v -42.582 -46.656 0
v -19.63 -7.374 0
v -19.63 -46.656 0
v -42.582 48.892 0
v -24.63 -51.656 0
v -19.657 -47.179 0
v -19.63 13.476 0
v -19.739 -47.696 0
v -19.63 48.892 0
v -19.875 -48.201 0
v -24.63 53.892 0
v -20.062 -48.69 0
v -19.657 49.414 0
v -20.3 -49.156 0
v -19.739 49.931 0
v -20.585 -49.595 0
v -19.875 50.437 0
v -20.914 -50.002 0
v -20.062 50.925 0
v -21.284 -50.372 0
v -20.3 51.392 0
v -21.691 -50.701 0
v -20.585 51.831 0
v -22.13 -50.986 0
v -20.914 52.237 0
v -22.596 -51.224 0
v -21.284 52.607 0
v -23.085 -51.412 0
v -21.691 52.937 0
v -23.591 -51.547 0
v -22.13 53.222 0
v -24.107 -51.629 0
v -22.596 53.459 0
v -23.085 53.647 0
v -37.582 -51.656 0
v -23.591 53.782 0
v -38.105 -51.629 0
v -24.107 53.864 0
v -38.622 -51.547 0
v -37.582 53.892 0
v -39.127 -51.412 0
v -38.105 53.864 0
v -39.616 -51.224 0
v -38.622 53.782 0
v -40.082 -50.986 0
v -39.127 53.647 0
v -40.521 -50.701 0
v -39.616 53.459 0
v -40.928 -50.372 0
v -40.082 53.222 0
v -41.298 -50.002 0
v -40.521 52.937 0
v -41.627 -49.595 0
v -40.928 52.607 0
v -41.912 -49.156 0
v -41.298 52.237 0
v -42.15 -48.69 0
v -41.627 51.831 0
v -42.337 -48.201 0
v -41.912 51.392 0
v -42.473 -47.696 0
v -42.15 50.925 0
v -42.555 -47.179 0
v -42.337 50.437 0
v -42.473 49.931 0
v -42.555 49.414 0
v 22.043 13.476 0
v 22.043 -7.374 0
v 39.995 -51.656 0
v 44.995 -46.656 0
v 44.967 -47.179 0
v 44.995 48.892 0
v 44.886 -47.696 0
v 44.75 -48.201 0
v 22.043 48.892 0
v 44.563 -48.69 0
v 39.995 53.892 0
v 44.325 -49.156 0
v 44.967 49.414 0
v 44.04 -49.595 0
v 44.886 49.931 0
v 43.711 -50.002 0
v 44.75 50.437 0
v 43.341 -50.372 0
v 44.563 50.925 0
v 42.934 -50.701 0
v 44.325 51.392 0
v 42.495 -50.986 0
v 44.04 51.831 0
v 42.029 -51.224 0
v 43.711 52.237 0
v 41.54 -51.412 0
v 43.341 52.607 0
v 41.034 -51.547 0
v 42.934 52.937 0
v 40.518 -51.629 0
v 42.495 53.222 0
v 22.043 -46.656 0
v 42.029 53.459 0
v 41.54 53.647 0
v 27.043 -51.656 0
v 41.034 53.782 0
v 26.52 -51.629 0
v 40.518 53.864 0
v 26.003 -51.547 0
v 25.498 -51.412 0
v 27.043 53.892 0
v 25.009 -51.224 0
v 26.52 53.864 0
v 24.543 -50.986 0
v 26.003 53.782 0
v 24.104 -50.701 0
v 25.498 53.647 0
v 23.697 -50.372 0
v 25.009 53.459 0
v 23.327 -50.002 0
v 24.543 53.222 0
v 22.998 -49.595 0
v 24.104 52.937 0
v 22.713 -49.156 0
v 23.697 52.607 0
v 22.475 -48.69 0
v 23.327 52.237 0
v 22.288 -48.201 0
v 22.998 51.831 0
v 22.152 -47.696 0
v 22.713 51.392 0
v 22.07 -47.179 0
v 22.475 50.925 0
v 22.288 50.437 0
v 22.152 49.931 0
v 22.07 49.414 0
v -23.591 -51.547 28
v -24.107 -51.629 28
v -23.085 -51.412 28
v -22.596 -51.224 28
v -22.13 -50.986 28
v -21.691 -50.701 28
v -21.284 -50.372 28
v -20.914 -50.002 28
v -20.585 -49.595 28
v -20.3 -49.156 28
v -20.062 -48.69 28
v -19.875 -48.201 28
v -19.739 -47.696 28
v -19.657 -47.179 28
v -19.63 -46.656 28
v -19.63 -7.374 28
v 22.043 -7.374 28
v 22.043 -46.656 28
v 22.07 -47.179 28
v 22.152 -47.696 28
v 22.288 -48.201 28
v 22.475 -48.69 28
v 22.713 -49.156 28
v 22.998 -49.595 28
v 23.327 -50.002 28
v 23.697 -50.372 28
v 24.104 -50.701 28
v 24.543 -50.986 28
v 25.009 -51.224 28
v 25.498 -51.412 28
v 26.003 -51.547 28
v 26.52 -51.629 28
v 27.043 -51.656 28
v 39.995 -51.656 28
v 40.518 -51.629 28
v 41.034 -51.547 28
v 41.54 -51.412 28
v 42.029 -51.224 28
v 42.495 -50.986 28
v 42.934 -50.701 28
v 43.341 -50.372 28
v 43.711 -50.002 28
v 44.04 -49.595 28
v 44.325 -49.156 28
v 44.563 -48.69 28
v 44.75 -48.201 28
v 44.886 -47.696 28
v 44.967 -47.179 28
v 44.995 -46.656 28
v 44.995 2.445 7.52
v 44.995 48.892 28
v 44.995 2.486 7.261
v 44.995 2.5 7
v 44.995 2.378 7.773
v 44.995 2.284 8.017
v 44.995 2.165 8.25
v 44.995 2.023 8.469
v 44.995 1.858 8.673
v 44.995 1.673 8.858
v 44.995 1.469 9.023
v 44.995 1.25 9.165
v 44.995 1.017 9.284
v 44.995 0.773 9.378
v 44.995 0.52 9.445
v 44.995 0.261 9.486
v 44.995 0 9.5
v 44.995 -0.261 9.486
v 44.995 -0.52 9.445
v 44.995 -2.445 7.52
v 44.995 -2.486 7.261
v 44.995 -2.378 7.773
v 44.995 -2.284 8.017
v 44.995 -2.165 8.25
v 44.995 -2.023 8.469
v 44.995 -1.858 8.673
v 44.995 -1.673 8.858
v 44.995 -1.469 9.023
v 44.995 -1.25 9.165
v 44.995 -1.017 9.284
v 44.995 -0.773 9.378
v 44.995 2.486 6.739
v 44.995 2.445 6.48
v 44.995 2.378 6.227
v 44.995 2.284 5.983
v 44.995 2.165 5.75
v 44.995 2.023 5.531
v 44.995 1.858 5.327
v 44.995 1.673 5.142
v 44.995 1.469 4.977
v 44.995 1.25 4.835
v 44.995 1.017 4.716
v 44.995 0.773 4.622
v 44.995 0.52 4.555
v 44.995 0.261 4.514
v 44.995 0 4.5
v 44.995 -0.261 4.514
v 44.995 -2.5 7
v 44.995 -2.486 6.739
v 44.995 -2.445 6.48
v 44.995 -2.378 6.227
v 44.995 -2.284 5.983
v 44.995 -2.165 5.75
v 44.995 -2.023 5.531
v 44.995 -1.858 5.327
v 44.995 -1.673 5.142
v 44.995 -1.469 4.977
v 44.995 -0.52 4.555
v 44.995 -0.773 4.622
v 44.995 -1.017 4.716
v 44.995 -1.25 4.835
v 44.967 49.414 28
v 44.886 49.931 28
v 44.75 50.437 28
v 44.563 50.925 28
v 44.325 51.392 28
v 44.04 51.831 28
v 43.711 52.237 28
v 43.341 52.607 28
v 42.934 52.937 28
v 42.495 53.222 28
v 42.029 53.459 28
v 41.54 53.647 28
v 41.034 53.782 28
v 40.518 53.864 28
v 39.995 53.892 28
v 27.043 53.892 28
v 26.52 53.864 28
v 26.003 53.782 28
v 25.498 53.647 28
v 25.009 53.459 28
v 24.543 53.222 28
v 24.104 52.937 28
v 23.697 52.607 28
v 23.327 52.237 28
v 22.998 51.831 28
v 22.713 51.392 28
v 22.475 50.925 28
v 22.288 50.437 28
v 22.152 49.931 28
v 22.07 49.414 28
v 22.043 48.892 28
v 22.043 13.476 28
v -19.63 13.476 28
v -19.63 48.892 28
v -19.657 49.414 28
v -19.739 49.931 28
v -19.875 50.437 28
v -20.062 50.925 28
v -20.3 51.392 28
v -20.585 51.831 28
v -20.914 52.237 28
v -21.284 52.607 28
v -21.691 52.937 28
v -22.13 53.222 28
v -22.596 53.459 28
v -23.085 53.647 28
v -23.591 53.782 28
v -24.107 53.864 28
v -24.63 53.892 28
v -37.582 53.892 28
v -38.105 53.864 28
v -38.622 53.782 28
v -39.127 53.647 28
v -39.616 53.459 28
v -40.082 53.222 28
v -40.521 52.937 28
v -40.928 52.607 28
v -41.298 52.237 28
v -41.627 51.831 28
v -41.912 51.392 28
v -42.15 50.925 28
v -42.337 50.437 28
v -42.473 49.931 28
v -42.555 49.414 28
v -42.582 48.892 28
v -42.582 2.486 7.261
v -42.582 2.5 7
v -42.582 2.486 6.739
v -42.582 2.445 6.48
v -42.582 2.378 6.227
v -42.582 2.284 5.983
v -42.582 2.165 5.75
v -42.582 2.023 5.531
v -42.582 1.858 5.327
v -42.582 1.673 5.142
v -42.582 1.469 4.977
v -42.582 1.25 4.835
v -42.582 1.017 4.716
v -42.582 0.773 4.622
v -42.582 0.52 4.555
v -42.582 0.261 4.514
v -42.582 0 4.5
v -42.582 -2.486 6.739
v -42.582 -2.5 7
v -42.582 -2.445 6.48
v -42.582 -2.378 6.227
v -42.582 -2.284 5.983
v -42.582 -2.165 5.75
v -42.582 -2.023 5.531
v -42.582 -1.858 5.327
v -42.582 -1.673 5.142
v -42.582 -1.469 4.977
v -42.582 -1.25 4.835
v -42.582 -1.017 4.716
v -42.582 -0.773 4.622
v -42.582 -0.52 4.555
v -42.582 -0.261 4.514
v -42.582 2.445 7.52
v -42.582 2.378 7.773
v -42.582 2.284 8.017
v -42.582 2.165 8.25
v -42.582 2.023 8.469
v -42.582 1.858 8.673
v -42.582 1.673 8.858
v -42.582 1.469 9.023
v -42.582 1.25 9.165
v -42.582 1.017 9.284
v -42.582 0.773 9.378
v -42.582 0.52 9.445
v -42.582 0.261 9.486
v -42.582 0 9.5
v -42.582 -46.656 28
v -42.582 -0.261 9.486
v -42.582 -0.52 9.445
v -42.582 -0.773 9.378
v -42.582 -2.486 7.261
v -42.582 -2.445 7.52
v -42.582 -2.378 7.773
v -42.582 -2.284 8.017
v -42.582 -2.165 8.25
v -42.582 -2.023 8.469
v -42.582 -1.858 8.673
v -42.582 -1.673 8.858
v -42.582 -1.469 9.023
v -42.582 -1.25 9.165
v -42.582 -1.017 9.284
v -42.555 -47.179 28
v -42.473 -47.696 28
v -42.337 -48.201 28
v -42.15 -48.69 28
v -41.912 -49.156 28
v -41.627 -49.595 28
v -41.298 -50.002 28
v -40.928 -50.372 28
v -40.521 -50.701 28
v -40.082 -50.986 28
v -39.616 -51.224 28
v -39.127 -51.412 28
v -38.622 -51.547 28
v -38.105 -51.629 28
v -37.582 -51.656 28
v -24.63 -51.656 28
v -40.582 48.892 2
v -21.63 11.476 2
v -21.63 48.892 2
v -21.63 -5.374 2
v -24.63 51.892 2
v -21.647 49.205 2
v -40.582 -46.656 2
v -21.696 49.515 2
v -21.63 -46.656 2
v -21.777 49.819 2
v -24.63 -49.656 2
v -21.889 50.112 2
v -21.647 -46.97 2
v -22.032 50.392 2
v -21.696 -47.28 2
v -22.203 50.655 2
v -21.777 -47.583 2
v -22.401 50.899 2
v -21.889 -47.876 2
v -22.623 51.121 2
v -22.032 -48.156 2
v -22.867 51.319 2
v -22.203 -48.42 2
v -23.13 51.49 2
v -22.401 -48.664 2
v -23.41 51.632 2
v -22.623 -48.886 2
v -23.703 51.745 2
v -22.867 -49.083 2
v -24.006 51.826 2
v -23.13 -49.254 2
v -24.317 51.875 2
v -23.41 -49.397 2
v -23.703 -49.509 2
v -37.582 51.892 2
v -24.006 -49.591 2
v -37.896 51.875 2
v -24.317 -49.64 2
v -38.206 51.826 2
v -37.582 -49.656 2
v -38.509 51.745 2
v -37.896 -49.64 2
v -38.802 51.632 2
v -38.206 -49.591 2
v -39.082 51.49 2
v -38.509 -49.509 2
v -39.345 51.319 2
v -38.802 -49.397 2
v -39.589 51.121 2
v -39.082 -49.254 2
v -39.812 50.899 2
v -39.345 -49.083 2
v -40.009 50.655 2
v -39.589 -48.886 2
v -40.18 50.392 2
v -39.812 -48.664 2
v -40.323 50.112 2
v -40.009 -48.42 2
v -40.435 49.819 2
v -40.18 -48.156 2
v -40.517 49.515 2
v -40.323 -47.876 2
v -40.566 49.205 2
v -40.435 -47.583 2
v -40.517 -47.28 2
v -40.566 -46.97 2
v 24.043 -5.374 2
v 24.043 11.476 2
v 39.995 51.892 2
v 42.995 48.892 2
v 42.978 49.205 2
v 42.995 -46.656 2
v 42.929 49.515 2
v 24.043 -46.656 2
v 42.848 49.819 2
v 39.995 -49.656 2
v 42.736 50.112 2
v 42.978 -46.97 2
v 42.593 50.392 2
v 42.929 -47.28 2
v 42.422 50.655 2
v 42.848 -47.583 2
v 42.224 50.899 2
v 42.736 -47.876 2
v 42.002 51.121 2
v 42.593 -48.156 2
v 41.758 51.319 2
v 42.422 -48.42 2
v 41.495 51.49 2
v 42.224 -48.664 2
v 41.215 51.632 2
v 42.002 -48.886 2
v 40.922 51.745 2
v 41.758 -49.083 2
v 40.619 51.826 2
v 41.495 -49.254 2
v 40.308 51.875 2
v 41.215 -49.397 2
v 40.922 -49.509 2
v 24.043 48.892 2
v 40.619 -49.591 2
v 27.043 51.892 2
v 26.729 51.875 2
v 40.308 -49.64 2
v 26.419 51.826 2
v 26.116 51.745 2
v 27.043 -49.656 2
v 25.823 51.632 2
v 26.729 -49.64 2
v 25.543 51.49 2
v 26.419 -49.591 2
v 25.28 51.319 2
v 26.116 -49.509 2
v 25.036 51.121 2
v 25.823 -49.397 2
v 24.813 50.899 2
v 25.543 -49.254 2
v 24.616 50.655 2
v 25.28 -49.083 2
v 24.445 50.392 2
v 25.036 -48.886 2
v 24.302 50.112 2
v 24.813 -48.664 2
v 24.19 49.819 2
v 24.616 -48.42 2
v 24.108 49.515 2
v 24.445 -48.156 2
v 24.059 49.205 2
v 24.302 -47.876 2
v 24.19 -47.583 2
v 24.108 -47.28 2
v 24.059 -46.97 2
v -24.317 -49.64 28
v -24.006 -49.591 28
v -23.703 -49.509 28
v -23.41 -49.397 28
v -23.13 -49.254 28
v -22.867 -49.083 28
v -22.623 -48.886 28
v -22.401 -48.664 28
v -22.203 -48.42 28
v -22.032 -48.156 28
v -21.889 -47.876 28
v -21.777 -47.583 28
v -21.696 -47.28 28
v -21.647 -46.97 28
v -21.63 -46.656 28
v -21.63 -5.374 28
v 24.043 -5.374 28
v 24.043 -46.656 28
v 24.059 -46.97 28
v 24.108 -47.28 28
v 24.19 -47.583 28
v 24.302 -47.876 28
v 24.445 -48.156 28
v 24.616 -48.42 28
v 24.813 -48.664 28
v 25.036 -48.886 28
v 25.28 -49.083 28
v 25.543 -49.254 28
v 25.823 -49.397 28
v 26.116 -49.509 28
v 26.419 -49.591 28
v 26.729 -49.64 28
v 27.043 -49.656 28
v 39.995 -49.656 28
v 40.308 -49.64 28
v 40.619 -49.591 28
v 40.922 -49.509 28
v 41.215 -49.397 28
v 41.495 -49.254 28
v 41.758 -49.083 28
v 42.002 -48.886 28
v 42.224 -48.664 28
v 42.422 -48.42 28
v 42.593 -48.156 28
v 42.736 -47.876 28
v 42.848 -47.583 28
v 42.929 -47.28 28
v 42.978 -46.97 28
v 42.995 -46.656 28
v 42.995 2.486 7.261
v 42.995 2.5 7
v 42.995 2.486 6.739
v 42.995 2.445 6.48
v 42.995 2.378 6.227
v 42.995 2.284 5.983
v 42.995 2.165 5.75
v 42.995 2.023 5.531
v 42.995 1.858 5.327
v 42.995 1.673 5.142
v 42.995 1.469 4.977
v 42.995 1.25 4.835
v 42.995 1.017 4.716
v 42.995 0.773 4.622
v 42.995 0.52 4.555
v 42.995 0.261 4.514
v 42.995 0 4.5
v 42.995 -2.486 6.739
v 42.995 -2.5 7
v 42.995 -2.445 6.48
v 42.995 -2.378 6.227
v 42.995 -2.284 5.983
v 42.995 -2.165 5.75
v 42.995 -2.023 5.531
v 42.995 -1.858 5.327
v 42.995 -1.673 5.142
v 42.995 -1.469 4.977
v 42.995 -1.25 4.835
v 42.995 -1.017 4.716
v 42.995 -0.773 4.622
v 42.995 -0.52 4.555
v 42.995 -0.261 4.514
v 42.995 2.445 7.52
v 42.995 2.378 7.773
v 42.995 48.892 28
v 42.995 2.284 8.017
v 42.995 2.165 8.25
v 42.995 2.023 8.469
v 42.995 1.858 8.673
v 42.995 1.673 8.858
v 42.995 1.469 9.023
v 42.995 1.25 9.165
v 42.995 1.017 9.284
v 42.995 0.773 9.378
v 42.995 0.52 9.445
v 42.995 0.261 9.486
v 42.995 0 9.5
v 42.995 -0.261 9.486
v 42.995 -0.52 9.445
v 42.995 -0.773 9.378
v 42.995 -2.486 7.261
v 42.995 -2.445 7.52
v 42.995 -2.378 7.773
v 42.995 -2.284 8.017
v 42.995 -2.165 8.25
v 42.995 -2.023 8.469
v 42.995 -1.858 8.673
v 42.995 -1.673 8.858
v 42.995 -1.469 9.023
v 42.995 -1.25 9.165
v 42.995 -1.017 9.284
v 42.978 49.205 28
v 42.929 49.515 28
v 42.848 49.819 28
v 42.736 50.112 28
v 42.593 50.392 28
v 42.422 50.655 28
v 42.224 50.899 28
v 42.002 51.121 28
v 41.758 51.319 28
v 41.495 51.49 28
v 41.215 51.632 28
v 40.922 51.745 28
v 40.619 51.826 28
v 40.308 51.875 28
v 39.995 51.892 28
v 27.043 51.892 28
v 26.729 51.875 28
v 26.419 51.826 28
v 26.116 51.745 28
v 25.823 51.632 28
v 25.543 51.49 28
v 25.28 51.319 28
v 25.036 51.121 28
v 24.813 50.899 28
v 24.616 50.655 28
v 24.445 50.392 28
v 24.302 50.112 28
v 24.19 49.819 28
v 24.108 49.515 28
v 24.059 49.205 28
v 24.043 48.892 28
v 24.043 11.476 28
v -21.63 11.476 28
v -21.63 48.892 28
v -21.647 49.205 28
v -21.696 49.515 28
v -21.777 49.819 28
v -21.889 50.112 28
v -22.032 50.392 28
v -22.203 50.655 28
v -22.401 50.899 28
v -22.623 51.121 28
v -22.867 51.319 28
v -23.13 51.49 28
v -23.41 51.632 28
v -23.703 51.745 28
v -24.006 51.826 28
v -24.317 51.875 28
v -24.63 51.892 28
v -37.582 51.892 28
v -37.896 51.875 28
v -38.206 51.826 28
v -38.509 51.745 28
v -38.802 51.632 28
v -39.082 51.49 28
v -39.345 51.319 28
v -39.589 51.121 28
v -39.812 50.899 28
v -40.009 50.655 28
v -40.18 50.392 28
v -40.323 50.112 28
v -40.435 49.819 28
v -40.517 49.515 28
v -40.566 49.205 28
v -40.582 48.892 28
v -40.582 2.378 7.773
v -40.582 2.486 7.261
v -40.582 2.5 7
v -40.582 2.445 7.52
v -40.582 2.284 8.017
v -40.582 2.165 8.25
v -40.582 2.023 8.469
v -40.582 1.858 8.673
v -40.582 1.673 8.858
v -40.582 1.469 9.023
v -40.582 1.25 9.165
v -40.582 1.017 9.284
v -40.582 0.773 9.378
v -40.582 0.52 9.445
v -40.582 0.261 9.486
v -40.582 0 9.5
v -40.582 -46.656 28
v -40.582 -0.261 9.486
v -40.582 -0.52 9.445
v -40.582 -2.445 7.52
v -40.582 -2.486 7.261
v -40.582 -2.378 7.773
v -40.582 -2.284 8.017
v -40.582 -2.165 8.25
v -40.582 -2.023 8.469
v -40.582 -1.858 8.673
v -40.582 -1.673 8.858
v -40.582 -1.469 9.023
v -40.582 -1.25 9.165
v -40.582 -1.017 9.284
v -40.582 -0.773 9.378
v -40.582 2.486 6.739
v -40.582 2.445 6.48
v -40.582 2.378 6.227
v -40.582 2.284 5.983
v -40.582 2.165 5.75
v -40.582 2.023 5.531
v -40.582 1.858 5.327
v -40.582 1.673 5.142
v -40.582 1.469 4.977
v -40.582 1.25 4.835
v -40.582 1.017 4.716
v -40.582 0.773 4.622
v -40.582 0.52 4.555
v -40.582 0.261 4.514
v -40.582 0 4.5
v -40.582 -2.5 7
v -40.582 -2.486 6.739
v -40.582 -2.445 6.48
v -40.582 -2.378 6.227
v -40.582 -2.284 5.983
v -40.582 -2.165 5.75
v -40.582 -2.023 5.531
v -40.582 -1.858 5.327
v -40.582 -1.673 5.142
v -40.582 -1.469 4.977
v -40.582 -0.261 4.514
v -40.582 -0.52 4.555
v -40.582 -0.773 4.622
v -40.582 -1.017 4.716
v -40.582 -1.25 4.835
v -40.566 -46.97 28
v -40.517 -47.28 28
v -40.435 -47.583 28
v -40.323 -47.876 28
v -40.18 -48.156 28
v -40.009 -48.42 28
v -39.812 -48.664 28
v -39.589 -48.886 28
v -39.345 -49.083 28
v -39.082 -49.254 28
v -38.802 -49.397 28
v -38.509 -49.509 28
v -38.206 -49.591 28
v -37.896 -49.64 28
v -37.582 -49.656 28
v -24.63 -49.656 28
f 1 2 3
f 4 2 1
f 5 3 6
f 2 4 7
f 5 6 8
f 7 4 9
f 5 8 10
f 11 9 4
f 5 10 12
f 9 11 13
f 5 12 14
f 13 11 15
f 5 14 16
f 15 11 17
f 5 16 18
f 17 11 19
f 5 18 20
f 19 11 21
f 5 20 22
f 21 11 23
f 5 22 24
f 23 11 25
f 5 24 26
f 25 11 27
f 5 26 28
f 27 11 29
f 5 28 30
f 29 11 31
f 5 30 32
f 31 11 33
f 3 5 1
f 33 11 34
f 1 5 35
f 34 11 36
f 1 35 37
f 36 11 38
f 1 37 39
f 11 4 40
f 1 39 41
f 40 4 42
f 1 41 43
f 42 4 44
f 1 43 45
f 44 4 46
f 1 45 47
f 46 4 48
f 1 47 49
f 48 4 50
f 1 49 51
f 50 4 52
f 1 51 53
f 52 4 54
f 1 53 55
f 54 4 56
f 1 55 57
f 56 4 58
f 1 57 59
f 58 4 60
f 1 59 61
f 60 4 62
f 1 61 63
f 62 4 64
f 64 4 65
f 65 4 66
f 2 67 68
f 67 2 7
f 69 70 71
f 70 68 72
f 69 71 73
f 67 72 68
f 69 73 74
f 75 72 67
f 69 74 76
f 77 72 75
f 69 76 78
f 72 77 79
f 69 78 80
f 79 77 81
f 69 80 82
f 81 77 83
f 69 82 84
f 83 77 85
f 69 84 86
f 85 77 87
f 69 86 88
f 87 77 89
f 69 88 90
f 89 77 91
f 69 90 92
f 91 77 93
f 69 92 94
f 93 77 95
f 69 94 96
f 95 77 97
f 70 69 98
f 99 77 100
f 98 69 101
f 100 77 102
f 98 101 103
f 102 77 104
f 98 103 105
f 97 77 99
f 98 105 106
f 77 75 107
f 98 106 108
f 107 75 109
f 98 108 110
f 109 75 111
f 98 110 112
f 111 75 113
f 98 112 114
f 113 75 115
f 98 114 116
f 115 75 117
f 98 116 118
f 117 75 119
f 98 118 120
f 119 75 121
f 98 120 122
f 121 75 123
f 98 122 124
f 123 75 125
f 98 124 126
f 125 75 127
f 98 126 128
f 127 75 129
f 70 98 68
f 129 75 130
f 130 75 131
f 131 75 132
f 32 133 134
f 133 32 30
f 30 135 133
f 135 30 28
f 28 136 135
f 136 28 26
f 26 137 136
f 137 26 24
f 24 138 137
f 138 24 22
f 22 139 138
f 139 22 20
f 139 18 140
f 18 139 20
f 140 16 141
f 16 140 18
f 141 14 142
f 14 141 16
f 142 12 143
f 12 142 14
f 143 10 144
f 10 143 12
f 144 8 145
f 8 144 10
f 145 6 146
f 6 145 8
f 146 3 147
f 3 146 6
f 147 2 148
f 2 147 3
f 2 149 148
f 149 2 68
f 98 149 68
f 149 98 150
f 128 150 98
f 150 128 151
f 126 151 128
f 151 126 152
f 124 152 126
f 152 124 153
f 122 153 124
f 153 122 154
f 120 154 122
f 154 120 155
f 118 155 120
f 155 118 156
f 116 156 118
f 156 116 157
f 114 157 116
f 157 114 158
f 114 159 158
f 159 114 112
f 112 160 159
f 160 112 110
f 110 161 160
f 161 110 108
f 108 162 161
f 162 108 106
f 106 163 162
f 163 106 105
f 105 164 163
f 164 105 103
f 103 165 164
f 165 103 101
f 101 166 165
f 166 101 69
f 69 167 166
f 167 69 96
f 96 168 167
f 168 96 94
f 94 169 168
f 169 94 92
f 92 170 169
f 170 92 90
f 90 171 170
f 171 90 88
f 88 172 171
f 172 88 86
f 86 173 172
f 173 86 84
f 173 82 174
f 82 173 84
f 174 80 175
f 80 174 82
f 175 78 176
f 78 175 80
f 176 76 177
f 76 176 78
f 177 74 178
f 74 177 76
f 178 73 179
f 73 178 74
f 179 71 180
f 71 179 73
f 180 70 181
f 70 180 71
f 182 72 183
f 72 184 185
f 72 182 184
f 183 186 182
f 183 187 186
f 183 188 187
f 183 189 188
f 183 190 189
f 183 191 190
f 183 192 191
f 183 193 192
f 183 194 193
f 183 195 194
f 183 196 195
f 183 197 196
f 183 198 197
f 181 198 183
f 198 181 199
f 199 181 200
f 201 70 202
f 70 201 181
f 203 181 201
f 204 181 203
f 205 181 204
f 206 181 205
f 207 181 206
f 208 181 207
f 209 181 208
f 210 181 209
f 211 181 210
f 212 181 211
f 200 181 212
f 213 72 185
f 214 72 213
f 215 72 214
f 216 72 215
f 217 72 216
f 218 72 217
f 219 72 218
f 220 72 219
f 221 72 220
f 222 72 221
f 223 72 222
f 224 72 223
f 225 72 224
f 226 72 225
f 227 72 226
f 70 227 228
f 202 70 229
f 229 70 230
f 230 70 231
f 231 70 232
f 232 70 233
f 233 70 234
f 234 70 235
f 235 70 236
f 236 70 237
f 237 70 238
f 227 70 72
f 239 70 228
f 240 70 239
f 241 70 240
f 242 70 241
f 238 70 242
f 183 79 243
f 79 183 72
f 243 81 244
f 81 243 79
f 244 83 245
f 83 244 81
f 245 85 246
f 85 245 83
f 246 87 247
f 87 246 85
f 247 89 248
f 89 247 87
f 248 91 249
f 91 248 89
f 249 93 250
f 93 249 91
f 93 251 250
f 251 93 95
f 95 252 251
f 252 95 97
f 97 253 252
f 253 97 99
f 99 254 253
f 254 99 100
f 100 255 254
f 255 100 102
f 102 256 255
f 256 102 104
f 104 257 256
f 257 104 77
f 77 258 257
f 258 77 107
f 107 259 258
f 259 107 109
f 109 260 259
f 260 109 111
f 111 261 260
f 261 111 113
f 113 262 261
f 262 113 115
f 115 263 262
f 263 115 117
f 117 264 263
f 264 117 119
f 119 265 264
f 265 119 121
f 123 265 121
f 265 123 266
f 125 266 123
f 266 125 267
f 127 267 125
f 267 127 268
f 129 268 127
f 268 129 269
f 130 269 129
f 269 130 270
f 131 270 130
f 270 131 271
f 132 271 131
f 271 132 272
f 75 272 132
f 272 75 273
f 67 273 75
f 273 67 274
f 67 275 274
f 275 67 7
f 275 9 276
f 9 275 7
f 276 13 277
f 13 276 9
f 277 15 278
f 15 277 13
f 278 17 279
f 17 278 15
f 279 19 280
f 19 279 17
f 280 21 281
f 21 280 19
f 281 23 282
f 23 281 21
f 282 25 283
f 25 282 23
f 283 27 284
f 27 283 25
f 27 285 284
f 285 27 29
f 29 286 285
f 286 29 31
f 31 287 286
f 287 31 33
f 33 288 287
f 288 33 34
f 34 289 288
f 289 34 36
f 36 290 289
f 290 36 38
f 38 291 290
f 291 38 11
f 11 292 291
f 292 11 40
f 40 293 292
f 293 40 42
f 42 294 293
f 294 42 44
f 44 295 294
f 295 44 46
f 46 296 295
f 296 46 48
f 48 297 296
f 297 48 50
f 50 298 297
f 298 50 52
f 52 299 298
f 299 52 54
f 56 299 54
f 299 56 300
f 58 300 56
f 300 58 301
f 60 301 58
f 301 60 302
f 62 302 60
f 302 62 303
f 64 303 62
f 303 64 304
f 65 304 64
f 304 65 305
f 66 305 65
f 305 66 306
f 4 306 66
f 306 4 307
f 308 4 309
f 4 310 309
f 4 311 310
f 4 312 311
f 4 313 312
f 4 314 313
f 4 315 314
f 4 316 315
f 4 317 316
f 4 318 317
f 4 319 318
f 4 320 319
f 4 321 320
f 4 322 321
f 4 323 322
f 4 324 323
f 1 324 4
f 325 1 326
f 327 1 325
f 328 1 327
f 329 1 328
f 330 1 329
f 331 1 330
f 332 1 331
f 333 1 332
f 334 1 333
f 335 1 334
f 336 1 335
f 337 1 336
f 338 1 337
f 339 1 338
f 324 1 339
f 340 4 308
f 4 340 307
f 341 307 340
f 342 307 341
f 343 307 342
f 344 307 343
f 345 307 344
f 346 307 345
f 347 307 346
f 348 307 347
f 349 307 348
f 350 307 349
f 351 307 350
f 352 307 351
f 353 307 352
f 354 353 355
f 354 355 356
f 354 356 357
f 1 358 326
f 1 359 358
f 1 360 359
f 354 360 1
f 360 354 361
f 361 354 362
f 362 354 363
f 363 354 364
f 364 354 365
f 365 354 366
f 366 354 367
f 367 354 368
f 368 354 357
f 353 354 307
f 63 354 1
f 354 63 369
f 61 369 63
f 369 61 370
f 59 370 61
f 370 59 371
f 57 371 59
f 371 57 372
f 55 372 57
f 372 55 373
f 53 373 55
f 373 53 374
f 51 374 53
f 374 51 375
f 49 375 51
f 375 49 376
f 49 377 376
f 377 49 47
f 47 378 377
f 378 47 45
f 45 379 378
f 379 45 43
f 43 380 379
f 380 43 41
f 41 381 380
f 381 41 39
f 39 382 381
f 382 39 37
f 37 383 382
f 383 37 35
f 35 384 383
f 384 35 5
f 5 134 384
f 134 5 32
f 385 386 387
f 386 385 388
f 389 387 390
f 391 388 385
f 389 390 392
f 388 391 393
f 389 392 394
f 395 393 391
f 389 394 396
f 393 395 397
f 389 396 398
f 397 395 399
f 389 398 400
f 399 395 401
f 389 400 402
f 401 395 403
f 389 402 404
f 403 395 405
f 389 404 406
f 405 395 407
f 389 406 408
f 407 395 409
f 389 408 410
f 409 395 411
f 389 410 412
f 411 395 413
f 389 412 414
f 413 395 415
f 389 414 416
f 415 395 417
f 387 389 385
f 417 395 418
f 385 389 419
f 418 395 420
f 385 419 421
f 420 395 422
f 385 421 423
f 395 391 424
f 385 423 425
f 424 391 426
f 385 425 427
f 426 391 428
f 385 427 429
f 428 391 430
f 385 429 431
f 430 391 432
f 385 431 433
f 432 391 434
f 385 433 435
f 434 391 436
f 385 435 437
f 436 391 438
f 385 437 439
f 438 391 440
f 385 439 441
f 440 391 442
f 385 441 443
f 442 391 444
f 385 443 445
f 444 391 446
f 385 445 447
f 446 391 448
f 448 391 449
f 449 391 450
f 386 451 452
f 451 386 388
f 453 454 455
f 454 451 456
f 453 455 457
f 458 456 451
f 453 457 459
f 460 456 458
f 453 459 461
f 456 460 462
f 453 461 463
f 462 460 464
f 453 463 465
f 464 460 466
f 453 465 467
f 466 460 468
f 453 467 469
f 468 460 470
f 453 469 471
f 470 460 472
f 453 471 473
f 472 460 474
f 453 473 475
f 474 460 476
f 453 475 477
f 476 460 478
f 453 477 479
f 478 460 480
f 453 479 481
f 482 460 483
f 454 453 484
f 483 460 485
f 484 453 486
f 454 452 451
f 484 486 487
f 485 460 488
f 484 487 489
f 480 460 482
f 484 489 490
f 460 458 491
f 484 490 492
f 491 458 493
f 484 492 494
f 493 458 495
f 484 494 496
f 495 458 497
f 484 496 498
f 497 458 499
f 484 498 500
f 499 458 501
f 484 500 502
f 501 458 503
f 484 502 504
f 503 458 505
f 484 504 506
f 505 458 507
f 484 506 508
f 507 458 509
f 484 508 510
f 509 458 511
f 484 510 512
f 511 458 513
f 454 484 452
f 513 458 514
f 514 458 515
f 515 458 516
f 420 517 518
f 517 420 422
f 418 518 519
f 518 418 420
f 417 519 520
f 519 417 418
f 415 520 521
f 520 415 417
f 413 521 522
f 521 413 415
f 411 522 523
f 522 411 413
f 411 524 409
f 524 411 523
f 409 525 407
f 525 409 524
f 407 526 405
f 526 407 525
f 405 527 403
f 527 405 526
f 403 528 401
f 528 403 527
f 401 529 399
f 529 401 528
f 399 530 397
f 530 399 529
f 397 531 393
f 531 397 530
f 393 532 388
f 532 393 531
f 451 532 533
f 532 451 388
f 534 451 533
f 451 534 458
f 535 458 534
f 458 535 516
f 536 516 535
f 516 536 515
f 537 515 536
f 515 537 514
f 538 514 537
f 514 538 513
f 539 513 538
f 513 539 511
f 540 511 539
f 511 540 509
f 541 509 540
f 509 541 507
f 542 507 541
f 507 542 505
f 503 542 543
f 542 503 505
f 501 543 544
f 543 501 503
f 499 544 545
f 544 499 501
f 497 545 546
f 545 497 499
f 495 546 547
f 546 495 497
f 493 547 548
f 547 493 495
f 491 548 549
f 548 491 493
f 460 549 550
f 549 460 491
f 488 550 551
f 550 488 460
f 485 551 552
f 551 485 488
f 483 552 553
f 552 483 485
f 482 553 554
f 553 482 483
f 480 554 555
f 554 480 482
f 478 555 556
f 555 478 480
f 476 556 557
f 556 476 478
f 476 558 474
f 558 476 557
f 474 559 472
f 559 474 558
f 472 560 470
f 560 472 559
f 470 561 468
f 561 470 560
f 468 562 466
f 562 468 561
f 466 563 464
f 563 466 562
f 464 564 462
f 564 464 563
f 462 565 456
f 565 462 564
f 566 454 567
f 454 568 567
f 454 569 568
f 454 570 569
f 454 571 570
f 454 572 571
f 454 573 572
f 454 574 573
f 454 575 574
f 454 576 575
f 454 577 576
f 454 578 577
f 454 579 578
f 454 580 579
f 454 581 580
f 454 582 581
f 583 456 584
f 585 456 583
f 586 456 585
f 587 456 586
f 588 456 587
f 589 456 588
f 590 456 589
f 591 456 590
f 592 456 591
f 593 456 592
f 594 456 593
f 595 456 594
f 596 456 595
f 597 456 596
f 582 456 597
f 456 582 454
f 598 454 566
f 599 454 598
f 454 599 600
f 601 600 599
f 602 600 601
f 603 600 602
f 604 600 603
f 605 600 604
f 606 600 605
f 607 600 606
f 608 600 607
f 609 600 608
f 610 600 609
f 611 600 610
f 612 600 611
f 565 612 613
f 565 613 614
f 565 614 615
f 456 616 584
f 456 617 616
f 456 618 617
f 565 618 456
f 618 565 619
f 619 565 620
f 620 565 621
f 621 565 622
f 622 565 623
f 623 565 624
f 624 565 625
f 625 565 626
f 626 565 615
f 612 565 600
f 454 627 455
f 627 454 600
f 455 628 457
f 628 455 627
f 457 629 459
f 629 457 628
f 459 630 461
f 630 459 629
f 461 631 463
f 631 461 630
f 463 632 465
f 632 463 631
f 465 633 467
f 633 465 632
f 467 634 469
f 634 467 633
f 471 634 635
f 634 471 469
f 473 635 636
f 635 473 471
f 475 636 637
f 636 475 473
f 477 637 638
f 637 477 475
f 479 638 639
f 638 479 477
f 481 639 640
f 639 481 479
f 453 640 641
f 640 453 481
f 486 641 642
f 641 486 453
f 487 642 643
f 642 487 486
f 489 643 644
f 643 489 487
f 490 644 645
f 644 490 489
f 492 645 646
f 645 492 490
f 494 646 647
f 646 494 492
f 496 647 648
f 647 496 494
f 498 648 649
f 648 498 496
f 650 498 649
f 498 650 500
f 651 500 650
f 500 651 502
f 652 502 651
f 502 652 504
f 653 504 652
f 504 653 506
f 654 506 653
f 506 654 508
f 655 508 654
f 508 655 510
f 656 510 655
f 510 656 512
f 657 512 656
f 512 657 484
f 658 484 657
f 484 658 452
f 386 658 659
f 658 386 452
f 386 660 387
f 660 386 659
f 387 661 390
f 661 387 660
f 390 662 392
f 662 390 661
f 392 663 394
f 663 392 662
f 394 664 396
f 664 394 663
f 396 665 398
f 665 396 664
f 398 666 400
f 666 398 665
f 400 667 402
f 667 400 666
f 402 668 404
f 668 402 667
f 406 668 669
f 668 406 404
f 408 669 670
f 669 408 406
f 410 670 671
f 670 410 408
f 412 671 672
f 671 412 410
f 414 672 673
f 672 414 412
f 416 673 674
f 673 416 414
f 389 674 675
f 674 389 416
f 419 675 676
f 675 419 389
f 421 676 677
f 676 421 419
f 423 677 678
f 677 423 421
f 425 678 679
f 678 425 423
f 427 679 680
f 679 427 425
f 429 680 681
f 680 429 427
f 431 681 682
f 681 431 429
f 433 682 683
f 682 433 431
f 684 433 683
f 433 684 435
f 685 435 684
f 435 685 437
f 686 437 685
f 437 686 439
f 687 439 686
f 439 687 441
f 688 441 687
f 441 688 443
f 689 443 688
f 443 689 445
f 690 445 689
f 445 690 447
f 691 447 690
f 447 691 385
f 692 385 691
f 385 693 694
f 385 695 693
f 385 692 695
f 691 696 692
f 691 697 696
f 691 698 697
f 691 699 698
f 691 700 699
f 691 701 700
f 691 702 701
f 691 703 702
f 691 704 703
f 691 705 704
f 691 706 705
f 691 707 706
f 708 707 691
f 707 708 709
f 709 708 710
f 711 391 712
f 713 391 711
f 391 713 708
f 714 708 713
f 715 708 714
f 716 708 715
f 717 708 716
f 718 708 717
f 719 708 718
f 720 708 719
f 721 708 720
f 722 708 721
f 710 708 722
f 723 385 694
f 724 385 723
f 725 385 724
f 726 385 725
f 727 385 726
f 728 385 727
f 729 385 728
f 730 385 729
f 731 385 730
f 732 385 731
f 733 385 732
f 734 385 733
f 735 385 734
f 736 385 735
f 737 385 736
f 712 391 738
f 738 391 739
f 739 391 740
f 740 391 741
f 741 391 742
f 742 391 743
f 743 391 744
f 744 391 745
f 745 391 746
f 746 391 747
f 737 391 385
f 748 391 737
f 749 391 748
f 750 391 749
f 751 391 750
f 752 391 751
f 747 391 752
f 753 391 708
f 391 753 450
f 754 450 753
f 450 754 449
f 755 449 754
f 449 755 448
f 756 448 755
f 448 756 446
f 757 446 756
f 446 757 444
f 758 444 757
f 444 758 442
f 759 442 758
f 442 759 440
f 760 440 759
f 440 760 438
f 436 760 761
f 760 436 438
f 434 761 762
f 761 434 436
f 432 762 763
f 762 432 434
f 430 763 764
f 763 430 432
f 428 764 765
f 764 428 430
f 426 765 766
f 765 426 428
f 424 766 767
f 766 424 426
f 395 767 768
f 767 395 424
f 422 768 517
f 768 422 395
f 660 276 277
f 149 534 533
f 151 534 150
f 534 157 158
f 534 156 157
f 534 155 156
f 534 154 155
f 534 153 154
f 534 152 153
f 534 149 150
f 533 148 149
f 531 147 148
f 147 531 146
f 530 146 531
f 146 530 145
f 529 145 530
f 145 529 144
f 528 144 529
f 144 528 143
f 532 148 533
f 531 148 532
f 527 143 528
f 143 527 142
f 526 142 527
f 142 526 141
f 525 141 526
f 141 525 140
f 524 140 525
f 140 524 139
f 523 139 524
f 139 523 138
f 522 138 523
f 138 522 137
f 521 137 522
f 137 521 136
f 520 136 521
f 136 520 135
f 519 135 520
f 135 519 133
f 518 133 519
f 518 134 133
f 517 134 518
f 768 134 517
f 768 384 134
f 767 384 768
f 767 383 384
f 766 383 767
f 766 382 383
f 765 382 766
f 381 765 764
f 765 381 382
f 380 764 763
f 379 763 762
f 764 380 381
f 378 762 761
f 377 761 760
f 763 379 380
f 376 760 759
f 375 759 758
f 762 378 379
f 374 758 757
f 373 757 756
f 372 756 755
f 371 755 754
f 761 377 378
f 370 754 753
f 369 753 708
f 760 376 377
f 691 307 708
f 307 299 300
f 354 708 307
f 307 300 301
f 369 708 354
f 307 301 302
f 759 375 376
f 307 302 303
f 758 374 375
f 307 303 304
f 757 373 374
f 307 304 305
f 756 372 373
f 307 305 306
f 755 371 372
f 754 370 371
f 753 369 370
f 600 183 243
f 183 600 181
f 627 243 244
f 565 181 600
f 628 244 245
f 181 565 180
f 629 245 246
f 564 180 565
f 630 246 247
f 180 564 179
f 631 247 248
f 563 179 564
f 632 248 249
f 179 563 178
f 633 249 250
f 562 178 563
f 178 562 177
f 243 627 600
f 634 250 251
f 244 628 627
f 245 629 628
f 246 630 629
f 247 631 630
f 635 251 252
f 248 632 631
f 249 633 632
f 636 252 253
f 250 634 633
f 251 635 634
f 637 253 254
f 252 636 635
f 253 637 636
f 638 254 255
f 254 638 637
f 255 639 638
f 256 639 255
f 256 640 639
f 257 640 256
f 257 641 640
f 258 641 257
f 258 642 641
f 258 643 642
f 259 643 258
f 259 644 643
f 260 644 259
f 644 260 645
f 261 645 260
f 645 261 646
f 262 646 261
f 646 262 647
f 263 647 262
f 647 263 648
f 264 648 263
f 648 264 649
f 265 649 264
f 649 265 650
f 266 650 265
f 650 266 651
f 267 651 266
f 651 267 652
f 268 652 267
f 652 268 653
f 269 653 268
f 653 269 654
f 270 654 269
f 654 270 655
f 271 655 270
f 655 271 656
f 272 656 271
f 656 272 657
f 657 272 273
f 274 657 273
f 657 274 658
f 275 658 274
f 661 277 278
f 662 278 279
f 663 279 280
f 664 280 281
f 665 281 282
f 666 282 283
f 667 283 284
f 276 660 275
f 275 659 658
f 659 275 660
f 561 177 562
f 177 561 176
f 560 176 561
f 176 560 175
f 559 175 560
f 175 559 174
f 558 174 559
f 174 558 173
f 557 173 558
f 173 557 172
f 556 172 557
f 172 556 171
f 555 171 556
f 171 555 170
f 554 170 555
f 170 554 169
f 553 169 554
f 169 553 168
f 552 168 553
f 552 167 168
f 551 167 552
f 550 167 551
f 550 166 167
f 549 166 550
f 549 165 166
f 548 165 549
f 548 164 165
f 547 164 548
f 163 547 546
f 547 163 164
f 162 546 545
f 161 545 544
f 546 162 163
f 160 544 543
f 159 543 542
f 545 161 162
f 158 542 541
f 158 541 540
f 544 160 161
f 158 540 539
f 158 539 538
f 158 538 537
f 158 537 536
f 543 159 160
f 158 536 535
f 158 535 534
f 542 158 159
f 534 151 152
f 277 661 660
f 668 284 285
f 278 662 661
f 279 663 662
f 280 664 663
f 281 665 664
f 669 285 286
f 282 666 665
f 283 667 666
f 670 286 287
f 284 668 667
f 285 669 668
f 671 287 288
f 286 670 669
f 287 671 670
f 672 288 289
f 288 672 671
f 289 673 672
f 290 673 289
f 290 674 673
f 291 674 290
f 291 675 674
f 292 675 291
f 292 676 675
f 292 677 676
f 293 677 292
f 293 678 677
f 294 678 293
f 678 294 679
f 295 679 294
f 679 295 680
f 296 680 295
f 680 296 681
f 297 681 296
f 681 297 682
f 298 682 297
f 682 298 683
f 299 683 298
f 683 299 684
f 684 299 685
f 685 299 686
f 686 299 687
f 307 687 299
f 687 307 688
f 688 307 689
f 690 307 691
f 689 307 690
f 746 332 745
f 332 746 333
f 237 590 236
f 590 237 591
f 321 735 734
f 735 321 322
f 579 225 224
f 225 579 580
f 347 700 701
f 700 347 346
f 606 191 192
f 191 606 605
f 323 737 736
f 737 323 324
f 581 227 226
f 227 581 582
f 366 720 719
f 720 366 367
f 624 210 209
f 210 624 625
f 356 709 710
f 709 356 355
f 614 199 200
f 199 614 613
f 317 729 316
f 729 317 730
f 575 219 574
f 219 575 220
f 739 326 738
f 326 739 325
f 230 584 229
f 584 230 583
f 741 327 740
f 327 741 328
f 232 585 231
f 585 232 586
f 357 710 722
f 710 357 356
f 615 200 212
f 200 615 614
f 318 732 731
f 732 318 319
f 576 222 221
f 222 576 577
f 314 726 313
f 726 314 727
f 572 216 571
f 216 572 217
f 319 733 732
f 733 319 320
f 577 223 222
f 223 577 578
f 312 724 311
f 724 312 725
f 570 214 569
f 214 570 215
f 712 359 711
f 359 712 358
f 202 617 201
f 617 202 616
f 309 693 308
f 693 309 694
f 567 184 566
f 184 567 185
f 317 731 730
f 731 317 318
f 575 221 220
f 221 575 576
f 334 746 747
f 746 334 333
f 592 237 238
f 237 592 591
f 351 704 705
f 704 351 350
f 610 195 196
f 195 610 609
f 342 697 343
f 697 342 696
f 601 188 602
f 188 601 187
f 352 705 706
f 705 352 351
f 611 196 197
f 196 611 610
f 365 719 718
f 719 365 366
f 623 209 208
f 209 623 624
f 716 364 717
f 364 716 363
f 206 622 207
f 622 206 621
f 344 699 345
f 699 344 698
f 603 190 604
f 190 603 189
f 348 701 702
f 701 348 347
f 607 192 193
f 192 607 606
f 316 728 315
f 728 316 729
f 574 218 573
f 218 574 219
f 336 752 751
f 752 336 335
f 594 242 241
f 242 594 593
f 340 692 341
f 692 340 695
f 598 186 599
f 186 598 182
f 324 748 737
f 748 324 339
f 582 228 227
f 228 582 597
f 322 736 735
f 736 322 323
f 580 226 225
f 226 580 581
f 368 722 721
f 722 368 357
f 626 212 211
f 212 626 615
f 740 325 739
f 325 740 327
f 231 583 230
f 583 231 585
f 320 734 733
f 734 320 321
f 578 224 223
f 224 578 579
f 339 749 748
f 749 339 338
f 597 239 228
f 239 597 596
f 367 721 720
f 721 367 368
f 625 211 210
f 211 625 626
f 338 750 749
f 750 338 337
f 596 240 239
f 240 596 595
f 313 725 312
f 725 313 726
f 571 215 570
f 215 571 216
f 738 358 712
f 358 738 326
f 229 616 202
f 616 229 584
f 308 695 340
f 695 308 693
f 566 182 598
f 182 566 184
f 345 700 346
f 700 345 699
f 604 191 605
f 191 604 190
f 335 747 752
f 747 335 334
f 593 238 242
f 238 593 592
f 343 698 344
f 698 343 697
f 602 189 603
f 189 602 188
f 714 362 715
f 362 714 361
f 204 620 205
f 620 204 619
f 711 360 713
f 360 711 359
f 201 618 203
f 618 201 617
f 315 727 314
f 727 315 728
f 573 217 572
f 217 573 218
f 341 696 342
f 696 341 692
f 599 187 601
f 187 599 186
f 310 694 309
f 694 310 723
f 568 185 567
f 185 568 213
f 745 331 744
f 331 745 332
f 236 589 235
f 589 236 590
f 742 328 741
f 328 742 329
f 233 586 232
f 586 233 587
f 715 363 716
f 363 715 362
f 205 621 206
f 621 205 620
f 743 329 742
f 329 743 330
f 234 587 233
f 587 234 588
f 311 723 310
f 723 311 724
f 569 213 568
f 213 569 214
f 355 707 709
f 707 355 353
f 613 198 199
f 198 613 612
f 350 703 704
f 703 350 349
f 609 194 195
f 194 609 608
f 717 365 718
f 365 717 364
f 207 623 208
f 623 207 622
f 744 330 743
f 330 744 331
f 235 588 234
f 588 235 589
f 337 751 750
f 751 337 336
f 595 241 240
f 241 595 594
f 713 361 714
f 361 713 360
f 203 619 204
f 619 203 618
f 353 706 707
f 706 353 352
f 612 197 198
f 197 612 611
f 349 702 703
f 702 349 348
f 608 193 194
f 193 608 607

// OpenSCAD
// AUTOMATICALLY GENERATED FILE: Letter_H
// SIGN SCULPTOR ENGINE V2

Render_Mode = "Body"; // Set to "Lid" to export the cover
Letter = "H";
Font_Size = 100;
Font_Name = "Arial:style=Black";
Light_Type = "Silicone_Neon_6mm";

// -- Engineering Constants --
Sign_Height = 30.0;
Wall_Thickness = 2.0;
Base_Thickness = 2.0;
Lid_Tolerance = 0.15;
Hole_Height = 5.0;
Hole_Size = 5.0;

// -- Logic Engine --
CW = (Light_Type == "Silicone_Neon_6mm") ? 6.0 :
     (Light_Type == "Silicone_Neon_8mm") ? 8.0 :
     (Light_Type == "LED_Strip_10mm")    ? 10.5 :
     (Light_Type == "Individual_Pixels")  ? 14.0 : 6.0;

Lip_Overhang = (Light_Type == "Silicone_Neon_6mm" || Light_Type == "Silicone_Neon_8mm") ? 0.4 : 0.0;

$fn = 60;

module letter_shape() {
    text(text=Letter, size=Font_Size, font=Font_Name, halign="center", valign="center");
}

module body_geometry() {
    difference() {
        // 1. Positive Block
        linear_extrude(Sign_Height)
            offset(r = CW/2 + Wall_Thickness)
            letter_shape();

        // 2. Light Channel
        translate([0,0, Base_Thickness])
            linear_extrude(Sign_Height + 1)
            offset(r = CW/2)
            letter_shape();

        // 3. Friction Lip
        if (Lip_Overhang > 0) {
            translate([0,0, Sign_Height - 2.0])
                linear_extrude(3.0)
                difference() {
                    offset(r = CW/2 + 5) letter_shape();
                    offset(r = CW/2 - Lip_Overhang) letter_shape();
                }
        }
        
        // 4. Lid Shelf
        translate([0,0, Sign_Height - 2.0])
            linear_extrude(3.0)
            offset(r = CW/2 + 1.5)
            letter_shape();

        // 5. WIRE CHANNELS (Dynamic Side Holes)
        // Left Hole
        translate([-Font_Size/1.8, 0, Hole_Height + Base_Thickness])
            rotate([0, 90, 0])
            cylinder(h = Font_Size, r = Hole_Size/2);
            
        // Right Hole
        translate([Font_Size/1.8, 0, Hole_Height + Base_Thickness])
            rotate([0, -90, 0])
            cylinder(h = Font_Size, r = Hole_Size/2);
    }
}

module lid_geometry() {
    color("White")
        linear_extrude(2.0)
        offset(r = (CW/2 + 1.5) - Lid_Tolerance)
        letter_shape();
}

// Render Controller
if (Render_Mode == "Body") {
    body_geometry();
} else if (Render_Mode == "Lid") {
    lid_geometry();
}
